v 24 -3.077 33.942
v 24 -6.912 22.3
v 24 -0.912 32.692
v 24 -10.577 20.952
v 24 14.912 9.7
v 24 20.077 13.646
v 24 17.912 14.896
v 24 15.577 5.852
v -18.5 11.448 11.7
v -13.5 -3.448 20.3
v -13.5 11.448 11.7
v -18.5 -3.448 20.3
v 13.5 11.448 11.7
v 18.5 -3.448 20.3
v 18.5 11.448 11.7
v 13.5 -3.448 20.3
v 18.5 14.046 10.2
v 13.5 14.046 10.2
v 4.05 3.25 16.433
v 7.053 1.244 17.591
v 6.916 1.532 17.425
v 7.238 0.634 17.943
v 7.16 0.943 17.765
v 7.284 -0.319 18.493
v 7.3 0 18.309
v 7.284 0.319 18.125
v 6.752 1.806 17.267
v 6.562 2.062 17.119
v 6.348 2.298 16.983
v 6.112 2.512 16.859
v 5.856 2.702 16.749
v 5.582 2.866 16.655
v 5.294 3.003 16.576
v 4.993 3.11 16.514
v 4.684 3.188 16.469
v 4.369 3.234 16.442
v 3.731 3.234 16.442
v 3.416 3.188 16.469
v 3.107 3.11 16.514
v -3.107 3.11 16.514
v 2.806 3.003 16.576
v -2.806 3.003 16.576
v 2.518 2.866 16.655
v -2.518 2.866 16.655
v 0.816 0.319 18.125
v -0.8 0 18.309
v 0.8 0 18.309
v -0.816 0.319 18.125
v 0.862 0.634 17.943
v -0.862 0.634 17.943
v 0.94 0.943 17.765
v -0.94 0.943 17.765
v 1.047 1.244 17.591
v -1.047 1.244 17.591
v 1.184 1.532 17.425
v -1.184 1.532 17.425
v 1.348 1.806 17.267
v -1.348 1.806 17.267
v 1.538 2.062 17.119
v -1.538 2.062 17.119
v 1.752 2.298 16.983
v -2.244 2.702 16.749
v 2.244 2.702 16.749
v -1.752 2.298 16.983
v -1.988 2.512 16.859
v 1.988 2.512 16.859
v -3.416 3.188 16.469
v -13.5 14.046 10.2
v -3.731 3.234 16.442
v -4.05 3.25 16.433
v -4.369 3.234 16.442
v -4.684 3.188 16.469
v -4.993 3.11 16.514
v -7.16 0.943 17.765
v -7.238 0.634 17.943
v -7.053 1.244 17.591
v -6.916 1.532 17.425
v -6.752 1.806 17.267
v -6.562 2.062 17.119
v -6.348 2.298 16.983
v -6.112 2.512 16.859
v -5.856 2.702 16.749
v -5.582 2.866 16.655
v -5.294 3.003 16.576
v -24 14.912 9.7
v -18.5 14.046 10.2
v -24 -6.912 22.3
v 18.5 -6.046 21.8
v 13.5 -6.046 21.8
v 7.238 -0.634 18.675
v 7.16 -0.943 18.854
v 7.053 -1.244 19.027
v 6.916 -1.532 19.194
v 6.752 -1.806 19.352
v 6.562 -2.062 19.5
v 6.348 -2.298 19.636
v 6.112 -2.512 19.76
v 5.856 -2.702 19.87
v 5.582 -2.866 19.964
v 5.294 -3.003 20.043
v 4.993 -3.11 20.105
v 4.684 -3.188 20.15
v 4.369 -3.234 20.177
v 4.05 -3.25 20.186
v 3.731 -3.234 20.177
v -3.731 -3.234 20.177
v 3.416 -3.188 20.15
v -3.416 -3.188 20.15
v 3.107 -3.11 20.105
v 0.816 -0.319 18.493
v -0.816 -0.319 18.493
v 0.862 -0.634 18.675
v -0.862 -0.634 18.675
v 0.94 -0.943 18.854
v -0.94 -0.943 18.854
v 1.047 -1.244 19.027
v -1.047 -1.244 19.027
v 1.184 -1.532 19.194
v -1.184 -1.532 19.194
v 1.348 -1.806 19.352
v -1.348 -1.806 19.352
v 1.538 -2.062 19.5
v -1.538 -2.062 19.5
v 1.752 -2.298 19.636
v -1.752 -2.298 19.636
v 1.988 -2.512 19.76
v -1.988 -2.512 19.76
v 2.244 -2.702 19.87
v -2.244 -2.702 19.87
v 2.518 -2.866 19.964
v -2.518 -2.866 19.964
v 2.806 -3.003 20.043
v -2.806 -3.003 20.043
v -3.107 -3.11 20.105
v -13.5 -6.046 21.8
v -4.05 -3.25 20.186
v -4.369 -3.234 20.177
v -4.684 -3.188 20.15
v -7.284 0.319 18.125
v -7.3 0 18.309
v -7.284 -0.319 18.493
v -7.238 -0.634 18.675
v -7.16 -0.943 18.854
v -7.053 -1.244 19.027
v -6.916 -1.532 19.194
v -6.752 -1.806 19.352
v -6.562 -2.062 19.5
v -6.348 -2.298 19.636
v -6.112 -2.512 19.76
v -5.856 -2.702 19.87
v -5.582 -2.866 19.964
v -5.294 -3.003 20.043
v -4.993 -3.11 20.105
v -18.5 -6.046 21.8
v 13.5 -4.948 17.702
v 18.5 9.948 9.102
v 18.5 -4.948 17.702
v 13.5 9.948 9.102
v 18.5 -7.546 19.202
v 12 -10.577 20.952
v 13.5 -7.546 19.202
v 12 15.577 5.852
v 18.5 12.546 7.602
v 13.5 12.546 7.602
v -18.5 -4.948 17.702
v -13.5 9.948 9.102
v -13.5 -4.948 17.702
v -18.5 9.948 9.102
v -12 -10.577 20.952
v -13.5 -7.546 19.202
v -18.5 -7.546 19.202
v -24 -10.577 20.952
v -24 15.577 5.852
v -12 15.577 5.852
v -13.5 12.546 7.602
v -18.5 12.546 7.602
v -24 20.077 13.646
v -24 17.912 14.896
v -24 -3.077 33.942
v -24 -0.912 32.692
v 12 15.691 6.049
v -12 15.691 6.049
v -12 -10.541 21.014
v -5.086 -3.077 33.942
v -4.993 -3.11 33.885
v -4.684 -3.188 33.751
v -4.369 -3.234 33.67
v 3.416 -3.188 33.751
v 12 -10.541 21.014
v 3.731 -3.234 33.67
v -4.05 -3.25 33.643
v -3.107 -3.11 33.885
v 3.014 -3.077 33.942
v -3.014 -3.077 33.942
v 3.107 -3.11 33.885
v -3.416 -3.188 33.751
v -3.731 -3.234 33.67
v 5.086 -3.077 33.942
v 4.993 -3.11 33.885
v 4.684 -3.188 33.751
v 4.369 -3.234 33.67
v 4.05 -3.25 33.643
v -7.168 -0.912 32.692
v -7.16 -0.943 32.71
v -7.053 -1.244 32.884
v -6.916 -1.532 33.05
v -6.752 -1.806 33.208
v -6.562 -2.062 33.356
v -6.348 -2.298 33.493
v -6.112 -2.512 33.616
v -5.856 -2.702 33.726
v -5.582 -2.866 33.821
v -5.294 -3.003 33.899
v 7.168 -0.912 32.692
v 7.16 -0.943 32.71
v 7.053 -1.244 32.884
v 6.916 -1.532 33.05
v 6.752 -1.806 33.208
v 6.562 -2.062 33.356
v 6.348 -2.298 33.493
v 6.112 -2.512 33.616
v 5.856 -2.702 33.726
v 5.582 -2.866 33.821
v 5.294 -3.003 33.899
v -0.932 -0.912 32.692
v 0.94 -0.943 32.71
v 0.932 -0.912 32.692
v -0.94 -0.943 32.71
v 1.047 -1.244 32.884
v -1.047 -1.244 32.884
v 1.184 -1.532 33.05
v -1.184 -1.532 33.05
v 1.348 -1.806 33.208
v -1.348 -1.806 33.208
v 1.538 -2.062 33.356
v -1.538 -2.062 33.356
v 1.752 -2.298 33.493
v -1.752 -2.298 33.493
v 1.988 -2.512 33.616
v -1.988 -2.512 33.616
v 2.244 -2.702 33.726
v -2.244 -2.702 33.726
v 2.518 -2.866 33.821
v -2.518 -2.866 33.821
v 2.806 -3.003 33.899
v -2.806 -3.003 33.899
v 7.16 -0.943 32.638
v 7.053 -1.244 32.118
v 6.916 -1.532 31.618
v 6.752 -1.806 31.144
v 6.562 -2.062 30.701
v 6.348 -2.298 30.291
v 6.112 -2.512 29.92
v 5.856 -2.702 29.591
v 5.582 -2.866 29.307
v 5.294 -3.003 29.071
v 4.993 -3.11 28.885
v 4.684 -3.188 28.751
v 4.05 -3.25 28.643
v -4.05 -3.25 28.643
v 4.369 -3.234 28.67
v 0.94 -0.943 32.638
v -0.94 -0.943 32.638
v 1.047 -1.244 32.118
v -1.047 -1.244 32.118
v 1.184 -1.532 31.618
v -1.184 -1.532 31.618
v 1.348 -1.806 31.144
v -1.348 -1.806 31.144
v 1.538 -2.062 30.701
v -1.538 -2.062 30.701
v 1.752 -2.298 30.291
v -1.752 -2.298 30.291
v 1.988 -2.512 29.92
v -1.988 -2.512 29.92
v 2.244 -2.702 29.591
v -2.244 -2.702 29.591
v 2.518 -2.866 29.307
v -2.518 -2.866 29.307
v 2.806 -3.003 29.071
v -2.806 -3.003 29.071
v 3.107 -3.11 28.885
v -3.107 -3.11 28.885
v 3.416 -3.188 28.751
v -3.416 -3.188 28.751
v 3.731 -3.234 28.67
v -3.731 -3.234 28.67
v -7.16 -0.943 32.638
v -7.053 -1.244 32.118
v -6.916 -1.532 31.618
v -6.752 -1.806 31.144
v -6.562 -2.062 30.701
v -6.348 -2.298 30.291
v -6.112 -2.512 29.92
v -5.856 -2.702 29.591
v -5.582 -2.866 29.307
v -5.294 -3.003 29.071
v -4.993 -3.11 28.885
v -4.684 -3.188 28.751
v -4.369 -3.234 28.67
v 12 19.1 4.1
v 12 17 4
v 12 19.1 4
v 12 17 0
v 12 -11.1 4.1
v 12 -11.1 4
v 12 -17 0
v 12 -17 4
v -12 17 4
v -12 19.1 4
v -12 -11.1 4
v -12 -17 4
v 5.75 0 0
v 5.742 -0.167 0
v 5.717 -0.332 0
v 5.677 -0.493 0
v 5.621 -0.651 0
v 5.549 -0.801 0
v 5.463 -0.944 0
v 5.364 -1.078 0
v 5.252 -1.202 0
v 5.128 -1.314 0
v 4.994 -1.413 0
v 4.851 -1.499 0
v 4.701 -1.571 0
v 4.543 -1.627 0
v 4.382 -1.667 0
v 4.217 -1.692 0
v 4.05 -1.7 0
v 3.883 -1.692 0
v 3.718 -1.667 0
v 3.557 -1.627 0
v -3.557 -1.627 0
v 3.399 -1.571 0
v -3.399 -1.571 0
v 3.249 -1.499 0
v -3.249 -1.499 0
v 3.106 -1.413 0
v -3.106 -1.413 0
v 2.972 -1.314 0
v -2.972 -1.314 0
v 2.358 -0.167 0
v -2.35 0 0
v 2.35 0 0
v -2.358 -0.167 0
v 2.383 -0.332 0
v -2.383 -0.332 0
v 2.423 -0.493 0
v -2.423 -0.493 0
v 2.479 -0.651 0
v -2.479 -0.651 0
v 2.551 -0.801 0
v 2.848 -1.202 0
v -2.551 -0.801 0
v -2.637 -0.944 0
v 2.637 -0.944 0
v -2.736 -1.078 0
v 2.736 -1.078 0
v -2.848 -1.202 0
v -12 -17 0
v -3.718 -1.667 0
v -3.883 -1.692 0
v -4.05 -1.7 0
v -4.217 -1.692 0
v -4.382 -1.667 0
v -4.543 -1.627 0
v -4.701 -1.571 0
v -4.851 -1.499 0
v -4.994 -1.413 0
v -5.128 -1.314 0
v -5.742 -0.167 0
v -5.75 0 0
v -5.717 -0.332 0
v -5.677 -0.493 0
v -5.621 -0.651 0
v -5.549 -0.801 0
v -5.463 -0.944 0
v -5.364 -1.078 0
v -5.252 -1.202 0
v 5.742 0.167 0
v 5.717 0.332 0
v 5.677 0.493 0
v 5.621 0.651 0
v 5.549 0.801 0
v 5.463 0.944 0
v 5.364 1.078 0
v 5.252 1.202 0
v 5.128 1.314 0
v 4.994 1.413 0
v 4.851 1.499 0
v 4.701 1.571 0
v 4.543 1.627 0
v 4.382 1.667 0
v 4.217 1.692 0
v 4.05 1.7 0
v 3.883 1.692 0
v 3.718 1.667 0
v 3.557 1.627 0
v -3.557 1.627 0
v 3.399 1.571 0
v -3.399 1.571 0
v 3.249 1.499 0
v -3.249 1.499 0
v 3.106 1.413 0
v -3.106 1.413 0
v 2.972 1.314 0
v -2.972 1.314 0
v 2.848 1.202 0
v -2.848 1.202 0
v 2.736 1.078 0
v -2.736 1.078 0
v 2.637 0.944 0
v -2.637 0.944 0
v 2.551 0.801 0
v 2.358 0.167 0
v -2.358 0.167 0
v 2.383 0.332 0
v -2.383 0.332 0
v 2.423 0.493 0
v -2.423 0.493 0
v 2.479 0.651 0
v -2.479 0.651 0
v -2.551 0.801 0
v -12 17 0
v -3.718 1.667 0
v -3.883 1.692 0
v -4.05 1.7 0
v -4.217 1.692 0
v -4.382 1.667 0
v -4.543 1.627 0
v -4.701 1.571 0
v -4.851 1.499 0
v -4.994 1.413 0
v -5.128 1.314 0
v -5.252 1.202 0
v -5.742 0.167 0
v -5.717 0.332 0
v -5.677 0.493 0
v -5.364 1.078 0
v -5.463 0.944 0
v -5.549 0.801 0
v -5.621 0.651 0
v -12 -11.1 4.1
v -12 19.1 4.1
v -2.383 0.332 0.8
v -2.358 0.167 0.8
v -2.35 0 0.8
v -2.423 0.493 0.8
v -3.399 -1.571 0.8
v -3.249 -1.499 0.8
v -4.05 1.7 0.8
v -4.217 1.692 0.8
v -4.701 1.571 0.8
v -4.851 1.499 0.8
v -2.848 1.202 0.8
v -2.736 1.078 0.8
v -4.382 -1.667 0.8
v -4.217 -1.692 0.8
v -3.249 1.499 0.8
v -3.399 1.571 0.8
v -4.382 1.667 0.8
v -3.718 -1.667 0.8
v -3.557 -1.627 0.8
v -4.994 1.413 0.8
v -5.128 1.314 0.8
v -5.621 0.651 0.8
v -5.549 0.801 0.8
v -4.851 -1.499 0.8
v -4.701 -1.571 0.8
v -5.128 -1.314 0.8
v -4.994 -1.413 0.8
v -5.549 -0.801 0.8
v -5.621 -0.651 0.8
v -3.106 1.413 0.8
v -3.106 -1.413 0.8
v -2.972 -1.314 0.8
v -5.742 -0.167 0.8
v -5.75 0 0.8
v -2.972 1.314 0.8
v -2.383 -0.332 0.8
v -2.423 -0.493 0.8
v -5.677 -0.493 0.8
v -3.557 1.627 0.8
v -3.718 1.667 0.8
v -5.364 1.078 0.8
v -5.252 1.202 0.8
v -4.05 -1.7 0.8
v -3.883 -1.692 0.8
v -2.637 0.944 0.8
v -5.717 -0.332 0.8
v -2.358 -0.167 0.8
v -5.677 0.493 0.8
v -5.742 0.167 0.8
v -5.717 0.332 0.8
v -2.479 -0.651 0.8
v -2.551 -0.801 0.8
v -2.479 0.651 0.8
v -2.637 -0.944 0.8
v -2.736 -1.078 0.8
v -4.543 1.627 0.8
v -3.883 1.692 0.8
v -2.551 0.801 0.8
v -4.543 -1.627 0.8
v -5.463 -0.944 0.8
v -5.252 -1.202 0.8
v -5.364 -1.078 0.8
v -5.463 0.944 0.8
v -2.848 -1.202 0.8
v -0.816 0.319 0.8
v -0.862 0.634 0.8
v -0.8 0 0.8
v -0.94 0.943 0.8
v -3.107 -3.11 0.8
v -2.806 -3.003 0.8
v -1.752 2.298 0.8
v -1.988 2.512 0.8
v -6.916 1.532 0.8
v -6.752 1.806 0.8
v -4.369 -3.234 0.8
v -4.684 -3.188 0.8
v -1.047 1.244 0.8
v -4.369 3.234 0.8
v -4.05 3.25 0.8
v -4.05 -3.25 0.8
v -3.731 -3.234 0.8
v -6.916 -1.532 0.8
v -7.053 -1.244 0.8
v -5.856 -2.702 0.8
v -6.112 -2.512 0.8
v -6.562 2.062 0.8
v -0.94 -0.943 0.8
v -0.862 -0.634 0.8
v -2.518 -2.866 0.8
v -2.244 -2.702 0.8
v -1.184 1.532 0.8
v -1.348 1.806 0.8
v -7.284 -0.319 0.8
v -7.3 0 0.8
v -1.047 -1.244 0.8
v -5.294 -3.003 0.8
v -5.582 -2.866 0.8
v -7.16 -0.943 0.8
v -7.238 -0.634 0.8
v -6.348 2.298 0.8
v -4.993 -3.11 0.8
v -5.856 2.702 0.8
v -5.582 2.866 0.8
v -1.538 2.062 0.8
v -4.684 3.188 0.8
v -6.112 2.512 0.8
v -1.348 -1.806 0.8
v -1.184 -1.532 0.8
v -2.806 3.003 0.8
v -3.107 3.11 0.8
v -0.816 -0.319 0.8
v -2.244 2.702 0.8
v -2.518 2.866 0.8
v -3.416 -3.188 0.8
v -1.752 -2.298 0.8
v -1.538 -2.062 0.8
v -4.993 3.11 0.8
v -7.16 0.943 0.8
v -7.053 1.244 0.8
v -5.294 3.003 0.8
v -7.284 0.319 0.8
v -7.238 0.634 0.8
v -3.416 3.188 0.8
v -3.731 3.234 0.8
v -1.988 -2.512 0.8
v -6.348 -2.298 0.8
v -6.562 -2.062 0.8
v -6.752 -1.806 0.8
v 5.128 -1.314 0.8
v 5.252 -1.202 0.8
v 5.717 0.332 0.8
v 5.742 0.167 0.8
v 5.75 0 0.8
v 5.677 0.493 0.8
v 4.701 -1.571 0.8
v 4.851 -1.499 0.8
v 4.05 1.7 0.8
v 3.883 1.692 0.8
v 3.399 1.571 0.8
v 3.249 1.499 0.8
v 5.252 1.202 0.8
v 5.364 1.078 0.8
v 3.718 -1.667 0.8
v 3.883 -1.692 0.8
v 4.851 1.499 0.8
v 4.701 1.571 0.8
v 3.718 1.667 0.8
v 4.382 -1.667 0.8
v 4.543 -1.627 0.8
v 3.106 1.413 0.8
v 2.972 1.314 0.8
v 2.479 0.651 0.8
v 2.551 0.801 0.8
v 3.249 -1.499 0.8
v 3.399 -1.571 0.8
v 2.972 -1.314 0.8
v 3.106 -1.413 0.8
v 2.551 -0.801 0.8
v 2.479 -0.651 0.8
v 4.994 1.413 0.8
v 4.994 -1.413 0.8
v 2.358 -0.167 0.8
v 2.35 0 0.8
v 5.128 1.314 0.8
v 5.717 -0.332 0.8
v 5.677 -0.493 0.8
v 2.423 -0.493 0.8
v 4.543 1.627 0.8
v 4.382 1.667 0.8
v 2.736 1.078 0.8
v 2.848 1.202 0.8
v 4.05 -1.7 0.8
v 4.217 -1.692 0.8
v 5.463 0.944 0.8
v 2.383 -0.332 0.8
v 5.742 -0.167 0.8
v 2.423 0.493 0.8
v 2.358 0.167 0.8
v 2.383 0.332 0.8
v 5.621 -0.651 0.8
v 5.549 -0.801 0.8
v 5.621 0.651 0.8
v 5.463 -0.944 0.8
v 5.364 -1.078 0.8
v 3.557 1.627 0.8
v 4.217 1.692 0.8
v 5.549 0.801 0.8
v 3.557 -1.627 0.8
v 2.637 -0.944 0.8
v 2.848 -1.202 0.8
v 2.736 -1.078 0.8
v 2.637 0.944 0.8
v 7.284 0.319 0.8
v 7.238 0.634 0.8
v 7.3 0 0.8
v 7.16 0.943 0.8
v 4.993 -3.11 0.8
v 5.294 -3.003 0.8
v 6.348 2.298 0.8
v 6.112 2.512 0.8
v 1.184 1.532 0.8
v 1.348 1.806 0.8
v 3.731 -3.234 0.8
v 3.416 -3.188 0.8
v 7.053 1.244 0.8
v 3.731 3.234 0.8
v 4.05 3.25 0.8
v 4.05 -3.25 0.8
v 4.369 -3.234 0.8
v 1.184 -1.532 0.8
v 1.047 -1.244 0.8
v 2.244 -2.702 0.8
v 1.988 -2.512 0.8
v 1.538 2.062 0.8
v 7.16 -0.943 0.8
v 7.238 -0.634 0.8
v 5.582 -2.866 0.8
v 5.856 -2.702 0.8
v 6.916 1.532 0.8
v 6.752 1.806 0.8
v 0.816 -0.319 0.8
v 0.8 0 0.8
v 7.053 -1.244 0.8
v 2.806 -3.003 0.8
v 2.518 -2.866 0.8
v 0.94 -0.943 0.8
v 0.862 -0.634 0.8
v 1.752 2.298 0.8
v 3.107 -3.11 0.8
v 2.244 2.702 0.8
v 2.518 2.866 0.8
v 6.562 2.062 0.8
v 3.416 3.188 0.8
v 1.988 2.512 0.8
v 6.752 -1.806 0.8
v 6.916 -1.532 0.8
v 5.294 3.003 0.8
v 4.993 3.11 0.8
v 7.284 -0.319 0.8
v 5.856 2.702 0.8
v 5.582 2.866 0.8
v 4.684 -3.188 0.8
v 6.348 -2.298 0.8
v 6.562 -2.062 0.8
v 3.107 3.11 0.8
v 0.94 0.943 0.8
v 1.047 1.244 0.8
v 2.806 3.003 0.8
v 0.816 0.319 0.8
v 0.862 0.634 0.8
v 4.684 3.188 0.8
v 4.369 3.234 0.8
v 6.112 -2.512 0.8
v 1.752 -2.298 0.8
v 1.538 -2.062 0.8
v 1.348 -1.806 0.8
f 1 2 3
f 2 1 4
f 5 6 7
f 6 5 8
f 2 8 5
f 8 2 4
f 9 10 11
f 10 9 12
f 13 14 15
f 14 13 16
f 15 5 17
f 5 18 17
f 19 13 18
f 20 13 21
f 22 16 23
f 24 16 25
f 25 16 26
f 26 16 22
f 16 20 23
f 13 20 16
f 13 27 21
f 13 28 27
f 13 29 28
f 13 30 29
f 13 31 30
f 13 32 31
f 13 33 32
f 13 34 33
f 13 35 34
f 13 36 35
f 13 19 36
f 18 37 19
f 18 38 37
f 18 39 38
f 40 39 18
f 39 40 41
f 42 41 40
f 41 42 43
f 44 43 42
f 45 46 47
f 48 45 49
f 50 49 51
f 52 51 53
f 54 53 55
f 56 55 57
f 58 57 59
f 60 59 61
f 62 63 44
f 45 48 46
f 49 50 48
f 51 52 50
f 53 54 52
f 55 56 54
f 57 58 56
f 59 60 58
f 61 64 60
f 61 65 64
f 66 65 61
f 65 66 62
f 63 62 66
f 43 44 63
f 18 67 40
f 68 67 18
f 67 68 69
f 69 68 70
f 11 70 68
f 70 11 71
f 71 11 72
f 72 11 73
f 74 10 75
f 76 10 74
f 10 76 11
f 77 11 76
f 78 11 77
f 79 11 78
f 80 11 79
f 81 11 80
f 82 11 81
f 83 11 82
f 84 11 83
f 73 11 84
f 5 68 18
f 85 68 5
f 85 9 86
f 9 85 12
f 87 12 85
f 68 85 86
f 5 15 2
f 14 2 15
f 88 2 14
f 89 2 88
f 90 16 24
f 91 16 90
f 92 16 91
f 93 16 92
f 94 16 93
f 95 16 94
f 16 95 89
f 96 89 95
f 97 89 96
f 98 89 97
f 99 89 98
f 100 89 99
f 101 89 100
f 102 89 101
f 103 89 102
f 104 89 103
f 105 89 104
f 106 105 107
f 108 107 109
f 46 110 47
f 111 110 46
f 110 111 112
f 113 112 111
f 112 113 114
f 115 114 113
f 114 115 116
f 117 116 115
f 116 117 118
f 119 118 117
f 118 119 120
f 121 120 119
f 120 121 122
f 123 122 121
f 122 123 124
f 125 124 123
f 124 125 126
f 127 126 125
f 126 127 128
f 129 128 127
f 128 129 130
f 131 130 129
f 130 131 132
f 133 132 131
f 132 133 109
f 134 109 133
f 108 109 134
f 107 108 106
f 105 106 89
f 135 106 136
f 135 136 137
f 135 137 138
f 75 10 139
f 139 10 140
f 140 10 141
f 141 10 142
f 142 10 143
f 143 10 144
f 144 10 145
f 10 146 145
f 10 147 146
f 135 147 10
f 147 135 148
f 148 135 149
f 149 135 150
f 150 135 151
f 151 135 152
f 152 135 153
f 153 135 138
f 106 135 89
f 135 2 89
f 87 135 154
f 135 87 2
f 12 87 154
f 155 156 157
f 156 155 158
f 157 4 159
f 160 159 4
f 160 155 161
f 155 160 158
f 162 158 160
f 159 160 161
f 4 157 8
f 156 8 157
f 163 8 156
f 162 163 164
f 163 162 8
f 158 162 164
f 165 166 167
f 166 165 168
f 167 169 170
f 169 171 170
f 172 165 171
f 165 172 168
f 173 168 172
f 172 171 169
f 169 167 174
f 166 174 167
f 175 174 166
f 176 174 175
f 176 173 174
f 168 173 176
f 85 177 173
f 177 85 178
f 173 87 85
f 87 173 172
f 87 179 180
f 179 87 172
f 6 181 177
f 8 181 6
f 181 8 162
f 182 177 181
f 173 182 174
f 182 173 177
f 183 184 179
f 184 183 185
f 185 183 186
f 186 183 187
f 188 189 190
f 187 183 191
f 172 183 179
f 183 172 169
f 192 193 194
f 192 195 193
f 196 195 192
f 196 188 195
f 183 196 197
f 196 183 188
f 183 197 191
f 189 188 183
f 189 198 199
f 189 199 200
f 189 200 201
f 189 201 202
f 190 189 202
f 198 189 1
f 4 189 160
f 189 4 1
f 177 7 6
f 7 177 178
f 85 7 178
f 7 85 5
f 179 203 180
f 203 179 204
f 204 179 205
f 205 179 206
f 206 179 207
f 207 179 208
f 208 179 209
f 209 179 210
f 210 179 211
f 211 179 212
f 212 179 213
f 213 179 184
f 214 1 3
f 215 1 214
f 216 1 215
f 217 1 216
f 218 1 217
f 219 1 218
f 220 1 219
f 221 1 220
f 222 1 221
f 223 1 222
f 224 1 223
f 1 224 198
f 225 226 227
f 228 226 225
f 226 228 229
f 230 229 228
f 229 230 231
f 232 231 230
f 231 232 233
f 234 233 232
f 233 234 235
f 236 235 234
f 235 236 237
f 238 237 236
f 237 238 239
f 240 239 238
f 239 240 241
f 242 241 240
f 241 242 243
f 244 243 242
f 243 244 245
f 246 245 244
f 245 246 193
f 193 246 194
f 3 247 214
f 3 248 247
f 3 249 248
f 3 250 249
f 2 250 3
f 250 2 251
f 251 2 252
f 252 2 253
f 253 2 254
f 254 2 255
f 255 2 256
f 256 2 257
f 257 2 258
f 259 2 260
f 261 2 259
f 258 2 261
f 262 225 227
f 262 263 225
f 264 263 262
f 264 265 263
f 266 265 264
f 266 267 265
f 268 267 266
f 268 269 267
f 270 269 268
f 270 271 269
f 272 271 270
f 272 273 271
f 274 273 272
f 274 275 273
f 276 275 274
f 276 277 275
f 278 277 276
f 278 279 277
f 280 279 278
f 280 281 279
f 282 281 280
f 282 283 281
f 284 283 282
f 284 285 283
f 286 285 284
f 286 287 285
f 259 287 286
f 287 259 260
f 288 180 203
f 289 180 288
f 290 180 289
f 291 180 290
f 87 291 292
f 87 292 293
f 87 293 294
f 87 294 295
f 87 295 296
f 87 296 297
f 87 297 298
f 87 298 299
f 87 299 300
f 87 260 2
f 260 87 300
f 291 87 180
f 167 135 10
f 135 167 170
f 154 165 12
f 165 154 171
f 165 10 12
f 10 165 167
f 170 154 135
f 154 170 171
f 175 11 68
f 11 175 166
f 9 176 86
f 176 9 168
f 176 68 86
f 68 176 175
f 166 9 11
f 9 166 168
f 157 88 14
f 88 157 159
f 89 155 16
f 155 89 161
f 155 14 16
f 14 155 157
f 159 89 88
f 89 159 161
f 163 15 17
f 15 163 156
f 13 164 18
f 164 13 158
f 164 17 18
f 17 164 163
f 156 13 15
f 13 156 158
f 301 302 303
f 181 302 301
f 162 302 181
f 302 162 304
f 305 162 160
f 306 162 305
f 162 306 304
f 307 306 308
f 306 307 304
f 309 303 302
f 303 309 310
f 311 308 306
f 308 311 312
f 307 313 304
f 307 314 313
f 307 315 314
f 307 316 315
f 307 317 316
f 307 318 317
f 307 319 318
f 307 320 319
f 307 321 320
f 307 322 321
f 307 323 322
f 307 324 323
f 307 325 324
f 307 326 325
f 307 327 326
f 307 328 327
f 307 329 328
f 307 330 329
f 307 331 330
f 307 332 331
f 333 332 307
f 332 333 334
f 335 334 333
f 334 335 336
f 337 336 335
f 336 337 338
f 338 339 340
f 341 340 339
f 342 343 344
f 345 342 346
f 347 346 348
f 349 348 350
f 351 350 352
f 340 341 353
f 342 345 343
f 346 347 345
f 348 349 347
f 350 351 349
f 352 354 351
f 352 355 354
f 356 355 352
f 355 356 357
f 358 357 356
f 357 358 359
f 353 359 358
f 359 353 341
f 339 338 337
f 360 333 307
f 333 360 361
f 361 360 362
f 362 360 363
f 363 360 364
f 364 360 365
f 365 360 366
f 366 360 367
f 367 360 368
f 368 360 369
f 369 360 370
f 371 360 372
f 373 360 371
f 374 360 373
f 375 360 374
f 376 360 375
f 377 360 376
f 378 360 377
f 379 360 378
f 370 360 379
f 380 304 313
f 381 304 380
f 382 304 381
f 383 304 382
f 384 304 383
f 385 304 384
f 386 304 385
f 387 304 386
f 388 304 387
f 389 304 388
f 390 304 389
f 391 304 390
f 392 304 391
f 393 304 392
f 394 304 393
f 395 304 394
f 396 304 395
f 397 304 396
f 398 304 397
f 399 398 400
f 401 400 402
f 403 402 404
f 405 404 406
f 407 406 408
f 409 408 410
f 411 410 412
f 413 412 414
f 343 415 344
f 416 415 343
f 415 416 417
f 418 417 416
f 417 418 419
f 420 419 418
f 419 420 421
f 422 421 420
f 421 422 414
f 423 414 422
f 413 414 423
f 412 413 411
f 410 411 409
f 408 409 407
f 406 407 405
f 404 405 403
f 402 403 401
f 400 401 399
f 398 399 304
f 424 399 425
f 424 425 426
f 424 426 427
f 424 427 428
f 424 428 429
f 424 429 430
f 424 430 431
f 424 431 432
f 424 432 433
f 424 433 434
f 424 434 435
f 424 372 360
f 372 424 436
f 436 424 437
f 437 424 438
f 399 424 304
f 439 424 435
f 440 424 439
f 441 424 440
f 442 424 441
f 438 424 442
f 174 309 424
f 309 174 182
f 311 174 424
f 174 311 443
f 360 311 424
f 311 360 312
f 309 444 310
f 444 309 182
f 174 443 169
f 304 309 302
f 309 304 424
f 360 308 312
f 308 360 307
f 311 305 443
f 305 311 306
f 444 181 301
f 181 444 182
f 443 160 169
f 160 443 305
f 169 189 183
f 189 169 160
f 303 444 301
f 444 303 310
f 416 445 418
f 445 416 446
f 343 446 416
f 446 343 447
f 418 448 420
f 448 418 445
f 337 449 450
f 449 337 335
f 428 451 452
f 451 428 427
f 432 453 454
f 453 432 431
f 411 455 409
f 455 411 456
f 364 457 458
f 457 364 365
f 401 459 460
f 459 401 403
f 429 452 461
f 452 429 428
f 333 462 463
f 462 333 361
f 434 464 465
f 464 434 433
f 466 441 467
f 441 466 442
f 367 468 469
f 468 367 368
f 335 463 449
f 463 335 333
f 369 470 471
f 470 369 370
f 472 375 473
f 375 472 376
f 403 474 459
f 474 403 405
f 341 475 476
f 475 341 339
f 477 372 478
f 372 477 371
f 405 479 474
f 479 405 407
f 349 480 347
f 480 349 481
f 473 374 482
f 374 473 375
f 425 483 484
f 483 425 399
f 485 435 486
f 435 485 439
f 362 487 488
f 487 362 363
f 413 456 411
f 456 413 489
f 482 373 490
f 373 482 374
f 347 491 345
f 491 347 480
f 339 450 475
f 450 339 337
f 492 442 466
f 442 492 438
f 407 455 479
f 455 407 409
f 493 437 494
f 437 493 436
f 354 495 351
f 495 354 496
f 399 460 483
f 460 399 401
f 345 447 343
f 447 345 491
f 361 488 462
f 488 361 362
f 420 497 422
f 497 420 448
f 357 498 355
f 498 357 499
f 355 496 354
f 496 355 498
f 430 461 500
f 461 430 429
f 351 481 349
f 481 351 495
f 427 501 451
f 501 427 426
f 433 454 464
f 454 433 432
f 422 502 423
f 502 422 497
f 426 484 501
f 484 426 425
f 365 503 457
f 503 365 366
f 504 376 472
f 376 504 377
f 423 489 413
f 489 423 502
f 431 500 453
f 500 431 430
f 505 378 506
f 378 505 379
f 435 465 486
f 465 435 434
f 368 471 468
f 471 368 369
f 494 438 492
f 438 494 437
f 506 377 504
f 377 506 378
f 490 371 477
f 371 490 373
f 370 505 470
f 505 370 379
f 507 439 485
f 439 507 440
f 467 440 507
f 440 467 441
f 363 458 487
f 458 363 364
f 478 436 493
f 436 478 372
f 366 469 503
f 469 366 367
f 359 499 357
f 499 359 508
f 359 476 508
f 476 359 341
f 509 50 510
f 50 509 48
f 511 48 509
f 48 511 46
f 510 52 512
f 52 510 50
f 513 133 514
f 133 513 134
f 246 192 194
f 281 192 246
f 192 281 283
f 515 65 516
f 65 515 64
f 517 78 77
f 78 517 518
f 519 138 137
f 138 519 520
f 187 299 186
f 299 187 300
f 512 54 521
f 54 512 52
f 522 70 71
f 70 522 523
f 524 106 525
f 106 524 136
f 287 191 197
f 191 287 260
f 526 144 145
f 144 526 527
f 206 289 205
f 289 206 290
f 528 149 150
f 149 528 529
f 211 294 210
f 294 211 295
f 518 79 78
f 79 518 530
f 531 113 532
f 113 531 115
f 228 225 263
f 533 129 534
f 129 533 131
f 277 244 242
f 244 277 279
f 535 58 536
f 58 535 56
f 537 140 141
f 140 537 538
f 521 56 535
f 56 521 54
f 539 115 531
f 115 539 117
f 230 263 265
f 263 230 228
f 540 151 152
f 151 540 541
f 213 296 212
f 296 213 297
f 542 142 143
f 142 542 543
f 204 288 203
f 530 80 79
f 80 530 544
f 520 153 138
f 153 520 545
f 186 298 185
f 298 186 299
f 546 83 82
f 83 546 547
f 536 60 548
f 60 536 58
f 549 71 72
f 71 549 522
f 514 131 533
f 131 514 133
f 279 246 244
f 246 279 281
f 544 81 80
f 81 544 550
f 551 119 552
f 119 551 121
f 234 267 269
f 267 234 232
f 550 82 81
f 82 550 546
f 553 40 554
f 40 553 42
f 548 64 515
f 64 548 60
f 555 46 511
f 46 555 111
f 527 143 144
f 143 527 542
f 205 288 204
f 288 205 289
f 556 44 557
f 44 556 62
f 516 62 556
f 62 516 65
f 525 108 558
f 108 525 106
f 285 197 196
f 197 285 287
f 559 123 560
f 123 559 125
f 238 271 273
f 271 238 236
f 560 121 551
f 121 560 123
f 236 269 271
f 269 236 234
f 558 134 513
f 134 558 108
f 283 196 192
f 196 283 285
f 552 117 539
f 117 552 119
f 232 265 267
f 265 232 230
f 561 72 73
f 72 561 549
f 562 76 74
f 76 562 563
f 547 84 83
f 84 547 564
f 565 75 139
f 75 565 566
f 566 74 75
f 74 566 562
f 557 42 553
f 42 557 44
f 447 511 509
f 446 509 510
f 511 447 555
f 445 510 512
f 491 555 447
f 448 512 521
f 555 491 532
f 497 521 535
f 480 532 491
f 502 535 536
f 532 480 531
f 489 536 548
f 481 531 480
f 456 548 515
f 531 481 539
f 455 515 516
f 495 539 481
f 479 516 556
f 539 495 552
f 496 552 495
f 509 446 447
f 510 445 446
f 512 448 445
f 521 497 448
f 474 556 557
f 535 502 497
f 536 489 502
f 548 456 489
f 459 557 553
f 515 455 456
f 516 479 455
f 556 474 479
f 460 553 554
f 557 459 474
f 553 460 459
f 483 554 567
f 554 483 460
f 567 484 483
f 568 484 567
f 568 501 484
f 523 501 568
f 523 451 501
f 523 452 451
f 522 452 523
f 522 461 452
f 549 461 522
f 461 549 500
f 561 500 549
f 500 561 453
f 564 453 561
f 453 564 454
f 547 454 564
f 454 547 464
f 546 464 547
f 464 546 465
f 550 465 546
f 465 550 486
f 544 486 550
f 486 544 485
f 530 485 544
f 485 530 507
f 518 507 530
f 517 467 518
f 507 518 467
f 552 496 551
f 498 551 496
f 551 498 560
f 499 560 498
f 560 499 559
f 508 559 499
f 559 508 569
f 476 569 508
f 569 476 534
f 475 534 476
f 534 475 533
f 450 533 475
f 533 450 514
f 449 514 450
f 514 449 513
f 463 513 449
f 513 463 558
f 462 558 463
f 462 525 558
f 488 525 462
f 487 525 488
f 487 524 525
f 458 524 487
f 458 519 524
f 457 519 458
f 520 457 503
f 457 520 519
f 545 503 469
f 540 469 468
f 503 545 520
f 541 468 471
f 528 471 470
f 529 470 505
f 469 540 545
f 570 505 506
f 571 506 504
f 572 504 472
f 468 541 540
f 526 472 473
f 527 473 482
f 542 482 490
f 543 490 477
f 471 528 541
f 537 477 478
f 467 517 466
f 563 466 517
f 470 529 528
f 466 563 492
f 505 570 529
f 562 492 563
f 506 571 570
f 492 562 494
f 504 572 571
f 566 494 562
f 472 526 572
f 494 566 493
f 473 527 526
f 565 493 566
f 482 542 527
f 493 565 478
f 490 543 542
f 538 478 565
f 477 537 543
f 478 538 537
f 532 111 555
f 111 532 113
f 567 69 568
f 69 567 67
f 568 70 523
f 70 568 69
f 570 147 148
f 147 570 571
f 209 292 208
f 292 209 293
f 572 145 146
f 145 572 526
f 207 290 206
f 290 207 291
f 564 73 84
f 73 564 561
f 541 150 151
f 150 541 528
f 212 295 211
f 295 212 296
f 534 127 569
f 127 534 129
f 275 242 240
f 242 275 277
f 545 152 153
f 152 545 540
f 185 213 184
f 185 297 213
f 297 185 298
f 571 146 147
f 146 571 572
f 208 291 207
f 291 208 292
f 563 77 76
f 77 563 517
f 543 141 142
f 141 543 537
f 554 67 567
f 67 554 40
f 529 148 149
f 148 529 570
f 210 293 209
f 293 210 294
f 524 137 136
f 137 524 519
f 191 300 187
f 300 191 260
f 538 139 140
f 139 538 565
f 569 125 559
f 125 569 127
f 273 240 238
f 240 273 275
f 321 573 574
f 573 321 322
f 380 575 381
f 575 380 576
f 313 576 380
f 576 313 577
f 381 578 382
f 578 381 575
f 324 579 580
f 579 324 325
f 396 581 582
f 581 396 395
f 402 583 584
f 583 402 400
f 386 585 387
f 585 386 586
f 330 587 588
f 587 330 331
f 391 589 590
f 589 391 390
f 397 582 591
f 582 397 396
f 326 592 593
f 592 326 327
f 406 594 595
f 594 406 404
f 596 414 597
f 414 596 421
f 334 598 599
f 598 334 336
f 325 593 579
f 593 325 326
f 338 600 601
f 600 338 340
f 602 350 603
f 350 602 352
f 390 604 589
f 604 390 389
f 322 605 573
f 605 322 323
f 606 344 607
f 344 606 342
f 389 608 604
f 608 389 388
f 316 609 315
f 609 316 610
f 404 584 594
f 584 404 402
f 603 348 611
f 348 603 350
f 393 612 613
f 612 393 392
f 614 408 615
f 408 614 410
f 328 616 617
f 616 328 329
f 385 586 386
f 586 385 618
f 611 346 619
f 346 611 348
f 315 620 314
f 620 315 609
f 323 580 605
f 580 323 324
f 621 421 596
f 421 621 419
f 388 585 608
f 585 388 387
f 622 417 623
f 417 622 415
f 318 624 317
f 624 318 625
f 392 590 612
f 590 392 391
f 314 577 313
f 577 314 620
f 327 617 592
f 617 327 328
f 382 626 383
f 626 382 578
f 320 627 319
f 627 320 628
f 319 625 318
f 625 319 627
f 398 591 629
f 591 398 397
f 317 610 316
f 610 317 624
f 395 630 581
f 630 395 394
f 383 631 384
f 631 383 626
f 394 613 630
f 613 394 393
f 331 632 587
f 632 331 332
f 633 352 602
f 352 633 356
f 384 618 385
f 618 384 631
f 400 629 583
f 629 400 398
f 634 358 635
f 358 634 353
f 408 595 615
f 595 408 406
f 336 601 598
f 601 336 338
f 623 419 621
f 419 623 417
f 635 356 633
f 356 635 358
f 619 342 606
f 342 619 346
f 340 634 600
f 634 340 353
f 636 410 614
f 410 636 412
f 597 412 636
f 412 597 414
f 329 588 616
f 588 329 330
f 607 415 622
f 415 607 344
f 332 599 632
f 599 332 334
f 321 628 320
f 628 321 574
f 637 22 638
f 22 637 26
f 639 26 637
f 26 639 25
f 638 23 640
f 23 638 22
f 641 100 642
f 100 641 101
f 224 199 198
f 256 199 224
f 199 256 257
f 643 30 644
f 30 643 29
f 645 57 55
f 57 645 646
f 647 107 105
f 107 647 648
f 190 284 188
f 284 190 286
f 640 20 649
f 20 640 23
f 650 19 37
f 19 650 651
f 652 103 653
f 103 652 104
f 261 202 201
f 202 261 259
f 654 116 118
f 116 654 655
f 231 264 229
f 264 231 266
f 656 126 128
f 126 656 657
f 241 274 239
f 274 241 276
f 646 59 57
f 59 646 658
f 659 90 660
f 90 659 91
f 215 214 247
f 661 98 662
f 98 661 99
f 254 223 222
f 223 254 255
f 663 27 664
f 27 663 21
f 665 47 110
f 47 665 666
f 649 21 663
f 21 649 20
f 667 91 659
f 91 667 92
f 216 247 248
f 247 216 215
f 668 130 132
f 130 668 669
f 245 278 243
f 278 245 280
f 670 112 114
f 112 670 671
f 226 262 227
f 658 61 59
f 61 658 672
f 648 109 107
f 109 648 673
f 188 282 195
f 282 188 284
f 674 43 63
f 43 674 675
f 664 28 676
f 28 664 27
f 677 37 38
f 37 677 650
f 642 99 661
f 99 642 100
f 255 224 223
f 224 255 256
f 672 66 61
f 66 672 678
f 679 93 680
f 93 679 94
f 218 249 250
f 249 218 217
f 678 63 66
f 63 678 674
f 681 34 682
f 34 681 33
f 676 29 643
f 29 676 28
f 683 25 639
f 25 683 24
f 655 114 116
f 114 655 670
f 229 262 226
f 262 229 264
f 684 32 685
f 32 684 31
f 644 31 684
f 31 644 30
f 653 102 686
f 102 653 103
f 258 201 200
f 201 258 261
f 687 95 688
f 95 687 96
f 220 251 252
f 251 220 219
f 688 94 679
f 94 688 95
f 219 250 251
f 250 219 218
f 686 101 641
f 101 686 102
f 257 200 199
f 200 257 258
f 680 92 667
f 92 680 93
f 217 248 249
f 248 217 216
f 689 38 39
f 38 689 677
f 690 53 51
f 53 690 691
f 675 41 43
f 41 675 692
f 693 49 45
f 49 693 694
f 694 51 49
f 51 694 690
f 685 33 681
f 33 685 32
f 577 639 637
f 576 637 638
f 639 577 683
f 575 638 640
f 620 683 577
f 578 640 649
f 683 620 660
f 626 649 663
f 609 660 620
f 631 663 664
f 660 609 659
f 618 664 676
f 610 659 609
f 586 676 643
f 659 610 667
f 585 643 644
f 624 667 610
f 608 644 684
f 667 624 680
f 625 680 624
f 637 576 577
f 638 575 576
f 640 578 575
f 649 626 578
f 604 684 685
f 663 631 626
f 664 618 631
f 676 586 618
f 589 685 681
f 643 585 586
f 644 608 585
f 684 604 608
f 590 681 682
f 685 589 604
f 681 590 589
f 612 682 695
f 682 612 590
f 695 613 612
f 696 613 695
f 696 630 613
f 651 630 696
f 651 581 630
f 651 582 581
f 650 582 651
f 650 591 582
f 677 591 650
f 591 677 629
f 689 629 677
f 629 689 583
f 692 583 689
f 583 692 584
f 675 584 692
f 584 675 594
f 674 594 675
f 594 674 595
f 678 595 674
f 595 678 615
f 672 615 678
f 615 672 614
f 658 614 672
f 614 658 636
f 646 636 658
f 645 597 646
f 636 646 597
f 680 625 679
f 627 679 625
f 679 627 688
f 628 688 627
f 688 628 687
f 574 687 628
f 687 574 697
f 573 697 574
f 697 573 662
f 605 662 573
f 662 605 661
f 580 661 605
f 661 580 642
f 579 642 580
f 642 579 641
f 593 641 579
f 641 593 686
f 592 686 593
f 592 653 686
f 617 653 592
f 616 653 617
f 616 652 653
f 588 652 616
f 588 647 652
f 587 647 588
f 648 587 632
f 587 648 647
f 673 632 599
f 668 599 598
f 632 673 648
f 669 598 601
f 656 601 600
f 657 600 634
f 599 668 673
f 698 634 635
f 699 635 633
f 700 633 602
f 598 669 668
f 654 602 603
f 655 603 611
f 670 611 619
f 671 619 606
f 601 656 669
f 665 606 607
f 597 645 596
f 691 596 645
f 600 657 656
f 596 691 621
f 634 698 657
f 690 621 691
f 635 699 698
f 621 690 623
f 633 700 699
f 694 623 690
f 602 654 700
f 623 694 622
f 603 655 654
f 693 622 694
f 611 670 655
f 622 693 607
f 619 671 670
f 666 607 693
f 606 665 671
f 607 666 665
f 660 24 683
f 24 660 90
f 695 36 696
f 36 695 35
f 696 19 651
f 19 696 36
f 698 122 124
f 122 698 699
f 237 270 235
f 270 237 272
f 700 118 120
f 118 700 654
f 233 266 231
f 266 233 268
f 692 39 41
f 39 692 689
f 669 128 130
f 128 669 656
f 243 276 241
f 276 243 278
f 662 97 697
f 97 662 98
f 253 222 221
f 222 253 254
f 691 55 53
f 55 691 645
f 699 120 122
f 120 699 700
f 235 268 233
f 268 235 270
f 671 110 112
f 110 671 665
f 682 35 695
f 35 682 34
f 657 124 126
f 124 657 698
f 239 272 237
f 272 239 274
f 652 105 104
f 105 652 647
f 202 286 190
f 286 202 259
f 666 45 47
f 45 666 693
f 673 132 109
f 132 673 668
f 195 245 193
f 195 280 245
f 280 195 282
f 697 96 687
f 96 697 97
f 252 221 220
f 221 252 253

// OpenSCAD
// file: cam_tray_lib.scad
include <config.scad>

// ============================================================
// SHARED C310 TRAY — library only, nothing to print from here.
// Used (via `use <>`) by wrist_camera_mount.scad and
// tower_camera_cradle.scad.
//
// Tray coordinate convention: origin at the center of the tray
// FLOOR TOP surface; the camera sits on it with its long axis
// along X, optical axis along +Y (lens side = +Y wall, which is
// kept low so it stays below the lens), body height along +Z.
// The tray is shorter than the camera body (tray_len < body
// width) so both ends stay open; two pairs of zip-tie slots
// through the floor strap the housing down — tolerant of the
// CONFIRM-flagged body dimensions.
// ============================================================

// inner tray depth (Y) around the camera body
function tray_inner_d() = cam_body_d + 2*cam_fit_clear;
// outer tray depth (Y) including both walls
function tray_outer_d() = tray_inner_d() + 2*tray_wall;

module cam_tray() {
    iw = tray_inner_d();
    difference() {
        union() {
            // floor
            translate([-tray_len/2, -iw/2 - tray_wall, -tray_floor])
                cube([tray_len, tray_outer_d(), tray_floor]);
            // front wall (+Y, lens side) — low, below the lens
            translate([-tray_len/2, iw/2, 0])
                cube([tray_len, tray_wall, tray_lip_front]);
            // back wall (-Y) — tall, takes the tilt load
            translate([-tray_len/2, -iw/2 - tray_wall, 0])
                cube([tray_len, tray_wall, tray_lip_back]);
        }
        // zip-tie slots: two per tie, just inside each wall, at
        // +/- zip_slot_x. Thread the ties before dropping the
        // camera in, then tighten over the housing.
        for (sx = [-1, 1]) for (sy = [-1, 1])
            translate([sx*zip_slot_x - zip_slot_w/2,
                       sy*(iw/2 - 1) - (sy > 0 ? zip_slot_t : 0),
                       -tray_floor - 1])
                cube([zip_slot_w, zip_slot_t, tray_floor + 2]);
    }
}

// Sloped pedestal connecting a flat base (top face at z=base_top,
// footprint pedestal_w wide in X, tray_outer_d deep in Y centered
// on y=fwd) to the underside of the tilted tray. The hull of the
// two slabs gives a solid printable wedge.
//
// tilt > 0 pitches the optical axis (+Y) downward (toward -Z).
module cam_tray_pedestal(base_top, fwd, rise, tilt, pedestal_w) {
    hull() {
        translate([-pedestal_w/2, fwd - tray_outer_d()/2, base_top])
            cube([pedestal_w, tray_outer_d(), 0.1]);
        cam_tray_place(fwd, base_top + rise, tilt)
            translate([-pedestal_w/2, -tray_outer_d()/2, -tray_floor])
                cube([pedestal_w, tray_outer_d(), 0.1]);
    }
}

// Places children from tray coordinates into part coordinates:
// tilt about X (optical +Y dips toward -Z), then move the floor-top
// origin to (0, fwd, z_floor).
module cam_tray_place(fwd, z_floor, tilt) {
    translate([0, fwd, z_floor]) rotate([-tilt, 0, 0]) children();
}
// main file
include <config.scad>
use <cam_tray_lib.scad>

// ============================================================
// WRIST CAMERA MOUNT — Logitech C310 (clip removed) on the SO-101
// wrist. Print this file TWICE — one per arm.
//
// INTERFACE (same as the official SO-ARM100 wrist mounts): two
// M3x8 screws through the plate into hex nuts that slide into the
// recesses on the wrist-roll element (remove motor 6, insert the
// nuts, reattach — see src/platform/README.md). Screw spacing is
// MEASURED from the official mount STL (8.10mm) — do not change.
//
// PART FRAME: origin at the screw-pair midpoint on the wrist face;
// X lateral (along the screw pair), +Y toward the fingertips,
// +Z away from the wrist face. The camera tray sits on a sloped
// pedestal, pitched wrist_cam_tilt_deg toward the fingertips so
// the grasp point is centered in frame.
//
// SCREW ACCESS: the pedestal covers the screw heads, so each
// counterbore continues upward as a driver shaft through the
// pedestal and tray floor — drive the screws through those, then
// drop the camera in and zip-tie it down.
// ============================================================

pedestal_w = 24;  // narrower than the tray so the zip slots stay clear

module wrist_camera_mount() {
    difference() {
        union() {
            // interface plate, centered on the screw midpoint
            translate([-wrist_plate_w/2, -wrist_plate_l/2, 0])
                cube([wrist_plate_w, wrist_plate_l, wrist_plate_thick]);
            cam_tray_pedestal(wrist_plate_thick, wrist_cam_fwd,
                               wrist_cam_rise, wrist_cam_tilt_deg,
                               pedestal_w);
            cam_tray_place(wrist_cam_fwd,
                            wrist_plate_thick + wrist_cam_rise,
                            wrist_cam_tilt_deg)
                cam_tray();
        }
        // M3 holes: clearance through the plate, head counterbored
        // 0.8mm above the wrist face, driver shaft continuing up
        // through pedestal and tray floor
        for (sx = [-1, 1])
            translate([sx*wrist_screw_spacing/2, 0, 0]) {
                translate([0, 0, -1])
                    cylinder(h=wrist_plate_thick + 2, d=wrist_screw_clear);
                translate([0, 0, wrist_plate_thick - wrist_screw_head_h])
                    cylinder(h=100, d=wrist_screw_head_dia + 0.5);
            }
    }
}

wrist_camera_mount();
